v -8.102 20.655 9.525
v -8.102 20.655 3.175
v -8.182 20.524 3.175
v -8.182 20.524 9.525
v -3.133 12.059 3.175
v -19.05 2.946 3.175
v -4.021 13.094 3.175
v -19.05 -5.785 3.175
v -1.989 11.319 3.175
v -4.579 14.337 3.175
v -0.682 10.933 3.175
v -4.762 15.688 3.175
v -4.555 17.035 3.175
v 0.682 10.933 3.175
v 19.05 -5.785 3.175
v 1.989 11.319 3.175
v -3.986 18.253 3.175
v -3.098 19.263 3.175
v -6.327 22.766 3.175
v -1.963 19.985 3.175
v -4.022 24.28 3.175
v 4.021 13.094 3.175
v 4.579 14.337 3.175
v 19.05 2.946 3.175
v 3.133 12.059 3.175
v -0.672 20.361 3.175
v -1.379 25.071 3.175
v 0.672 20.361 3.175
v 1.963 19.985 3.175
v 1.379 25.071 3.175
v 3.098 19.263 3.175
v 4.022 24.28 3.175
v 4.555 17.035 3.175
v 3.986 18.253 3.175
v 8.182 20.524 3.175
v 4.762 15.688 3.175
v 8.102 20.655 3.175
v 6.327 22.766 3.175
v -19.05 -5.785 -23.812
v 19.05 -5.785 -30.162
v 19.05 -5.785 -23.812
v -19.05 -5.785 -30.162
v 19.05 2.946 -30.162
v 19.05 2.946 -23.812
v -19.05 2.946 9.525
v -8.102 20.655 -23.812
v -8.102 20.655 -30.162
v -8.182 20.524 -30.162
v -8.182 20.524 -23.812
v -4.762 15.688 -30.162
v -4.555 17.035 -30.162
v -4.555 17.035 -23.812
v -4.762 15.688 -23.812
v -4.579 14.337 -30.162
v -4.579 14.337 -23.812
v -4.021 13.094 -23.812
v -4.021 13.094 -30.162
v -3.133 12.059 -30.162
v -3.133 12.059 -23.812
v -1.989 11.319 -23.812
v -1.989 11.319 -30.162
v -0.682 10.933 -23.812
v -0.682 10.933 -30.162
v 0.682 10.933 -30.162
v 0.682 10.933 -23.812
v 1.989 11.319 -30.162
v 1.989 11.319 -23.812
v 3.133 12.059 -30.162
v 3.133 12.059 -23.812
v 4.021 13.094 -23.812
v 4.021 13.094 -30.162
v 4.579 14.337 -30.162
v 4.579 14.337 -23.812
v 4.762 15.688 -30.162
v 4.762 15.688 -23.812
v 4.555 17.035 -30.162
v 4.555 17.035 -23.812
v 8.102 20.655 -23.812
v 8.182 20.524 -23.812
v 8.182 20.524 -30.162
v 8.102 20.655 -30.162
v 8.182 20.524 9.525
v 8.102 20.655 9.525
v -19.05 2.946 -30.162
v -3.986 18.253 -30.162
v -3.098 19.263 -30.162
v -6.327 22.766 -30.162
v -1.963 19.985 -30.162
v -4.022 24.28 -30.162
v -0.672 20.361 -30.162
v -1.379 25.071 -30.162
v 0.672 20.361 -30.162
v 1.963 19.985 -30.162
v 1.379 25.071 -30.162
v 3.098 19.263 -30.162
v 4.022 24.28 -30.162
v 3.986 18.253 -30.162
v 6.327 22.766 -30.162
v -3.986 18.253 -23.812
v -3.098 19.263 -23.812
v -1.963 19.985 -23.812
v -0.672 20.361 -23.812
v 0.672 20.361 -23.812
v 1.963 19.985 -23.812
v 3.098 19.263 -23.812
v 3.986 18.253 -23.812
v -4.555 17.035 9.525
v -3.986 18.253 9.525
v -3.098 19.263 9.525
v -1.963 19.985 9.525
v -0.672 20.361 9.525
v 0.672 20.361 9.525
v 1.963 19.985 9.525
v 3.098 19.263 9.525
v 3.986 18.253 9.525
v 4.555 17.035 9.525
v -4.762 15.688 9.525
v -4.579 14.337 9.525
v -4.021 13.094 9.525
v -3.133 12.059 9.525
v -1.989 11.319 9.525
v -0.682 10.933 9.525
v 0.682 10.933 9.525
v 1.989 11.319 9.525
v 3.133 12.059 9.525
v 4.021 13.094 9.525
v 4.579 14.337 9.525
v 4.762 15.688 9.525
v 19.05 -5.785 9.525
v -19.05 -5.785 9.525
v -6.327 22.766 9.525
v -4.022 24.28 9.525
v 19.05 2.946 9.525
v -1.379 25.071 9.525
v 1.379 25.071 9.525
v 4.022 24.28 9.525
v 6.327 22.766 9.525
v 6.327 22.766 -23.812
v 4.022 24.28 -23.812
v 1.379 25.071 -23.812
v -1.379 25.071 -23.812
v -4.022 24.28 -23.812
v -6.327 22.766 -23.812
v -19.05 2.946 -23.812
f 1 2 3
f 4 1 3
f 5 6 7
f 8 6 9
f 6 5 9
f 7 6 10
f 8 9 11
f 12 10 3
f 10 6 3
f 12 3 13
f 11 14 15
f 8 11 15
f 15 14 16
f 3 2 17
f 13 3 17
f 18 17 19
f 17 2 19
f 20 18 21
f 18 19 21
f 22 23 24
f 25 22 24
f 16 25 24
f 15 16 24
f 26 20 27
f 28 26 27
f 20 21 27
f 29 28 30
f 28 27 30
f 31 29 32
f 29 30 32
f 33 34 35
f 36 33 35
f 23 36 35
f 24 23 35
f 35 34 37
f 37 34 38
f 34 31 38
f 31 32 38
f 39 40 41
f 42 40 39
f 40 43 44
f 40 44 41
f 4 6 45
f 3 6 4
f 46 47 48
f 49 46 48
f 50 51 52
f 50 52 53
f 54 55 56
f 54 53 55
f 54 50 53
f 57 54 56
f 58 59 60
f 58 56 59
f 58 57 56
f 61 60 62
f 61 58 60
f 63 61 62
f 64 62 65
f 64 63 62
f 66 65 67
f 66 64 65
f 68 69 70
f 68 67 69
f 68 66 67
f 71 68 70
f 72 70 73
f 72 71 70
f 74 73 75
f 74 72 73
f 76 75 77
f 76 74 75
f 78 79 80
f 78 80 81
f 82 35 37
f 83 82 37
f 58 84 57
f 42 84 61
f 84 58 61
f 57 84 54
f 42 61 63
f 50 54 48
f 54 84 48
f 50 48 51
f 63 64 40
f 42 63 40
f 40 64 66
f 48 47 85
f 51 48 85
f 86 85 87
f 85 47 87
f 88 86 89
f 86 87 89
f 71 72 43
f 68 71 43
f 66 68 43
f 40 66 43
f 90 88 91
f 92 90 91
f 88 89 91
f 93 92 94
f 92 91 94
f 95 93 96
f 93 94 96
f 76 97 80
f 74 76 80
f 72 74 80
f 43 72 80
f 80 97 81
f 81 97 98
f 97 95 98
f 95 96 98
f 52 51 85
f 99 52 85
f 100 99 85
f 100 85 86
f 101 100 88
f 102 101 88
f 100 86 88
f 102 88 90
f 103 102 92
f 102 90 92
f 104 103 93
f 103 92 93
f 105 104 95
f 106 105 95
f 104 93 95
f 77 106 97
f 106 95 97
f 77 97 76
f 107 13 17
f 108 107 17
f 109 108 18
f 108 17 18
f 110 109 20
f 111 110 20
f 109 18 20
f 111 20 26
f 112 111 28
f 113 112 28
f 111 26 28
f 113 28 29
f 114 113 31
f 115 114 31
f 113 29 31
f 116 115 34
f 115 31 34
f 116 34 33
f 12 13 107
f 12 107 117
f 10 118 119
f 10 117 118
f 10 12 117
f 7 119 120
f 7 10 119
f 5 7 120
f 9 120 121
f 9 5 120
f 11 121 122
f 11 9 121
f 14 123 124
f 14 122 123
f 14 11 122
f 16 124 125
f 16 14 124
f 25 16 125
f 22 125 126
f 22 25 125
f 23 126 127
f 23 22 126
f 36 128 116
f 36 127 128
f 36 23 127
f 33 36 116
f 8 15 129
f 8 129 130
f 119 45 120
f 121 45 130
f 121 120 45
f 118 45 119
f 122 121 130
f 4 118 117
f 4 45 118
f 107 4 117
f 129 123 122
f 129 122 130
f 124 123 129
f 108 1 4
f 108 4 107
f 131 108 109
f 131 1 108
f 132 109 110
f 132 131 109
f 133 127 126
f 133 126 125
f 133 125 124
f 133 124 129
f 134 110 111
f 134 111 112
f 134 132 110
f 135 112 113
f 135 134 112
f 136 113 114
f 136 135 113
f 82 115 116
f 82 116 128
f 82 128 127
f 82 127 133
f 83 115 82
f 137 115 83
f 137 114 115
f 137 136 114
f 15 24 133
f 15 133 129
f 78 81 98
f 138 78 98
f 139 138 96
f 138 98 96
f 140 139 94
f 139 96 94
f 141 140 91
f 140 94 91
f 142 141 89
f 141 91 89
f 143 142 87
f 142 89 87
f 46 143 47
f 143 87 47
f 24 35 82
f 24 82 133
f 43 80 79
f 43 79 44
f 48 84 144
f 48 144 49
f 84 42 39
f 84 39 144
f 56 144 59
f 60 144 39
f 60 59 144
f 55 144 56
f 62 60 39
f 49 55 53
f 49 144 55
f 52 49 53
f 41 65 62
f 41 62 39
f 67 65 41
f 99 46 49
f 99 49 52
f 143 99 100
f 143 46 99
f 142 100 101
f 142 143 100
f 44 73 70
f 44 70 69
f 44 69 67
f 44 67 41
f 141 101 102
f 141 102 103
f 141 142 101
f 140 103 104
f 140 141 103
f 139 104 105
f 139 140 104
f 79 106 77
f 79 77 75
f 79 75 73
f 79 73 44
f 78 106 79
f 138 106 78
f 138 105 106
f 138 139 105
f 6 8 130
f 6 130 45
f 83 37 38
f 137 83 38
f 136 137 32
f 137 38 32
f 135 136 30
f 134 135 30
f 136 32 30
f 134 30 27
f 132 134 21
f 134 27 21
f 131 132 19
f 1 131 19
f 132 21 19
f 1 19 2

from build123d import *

# Parameters (mm, degrees)
SKETCH1_R           = 9.525
SKETCH1_W           = 76.2
SKETCH1_H           = 17.4625
BOSS_EXTRUDE1_DEPTH = 12.7
LPATTERN1_COUNT     = 2
LPATTERN1_PITCH     = 33.3375
SCALE1_START        = -33.3375
SCALE1_DEPTH        = 46.0375
SCALE1_START_2      = -23.8125
SCALE1_2_DEPTH      = 26.9875
SCALE1_3_DEPTH      = 3.175
SCALE1_START_3      = 9.525
SCALE1_4_DEPTH      = 3.175
SCALE1_START_4      = -30.1625
SCALE1_5_DEPTH      = 6.35
SCALE1_START_5      = 3.175
SCALE1_6_DEPTH      = 6.35


# Read off the part's stored shape, not the designer's step: Scale1
with BuildPart() as part:
    # Sketch1 → Boss-Extrude1 (new body)
    # profile 1 of 2: a face of its own
    with BuildSketch(Plane.XY):
        with BuildLine():
            ThreePointArc((-16.203400299, 35.417600449), (0, 44.45), (16.203400299, 35.417600449))
            Line((16.203400299, 35.417600449), (38.1, 0))
            Line((38.1, 0), (-38.1, 0))
            Line((-38.1, 0), (-16.203400299, 35.417600449))
        make_face()
        with Locations((0, 25.4)):
            Circle(SKETCH1_R, mode=Mode.SUBTRACT)
    # profile 2 of 2: a face of its own
    with BuildSketch(Plane.XY):
        with Locations((0, -8.73125)):
            Rectangle(SKETCH1_W, SKETCH1_H)
    extrude(amount=BOSS_EXTRUDE1_DEPTH)


with BuildPart() as lpattern1_1:
    # LPattern1: pattern copy
    add(part.part.moved(Location(Vector(0, 0, -1) * (1 * LPATTERN1_PITCH))))


with BuildPart() as scale1_tool:
    # Scale1 outline → Scale1 (new body)
    # profile 1 of 2: a face of its own
    with BuildSketch(Plane.XY.offset(SCALE1_START)):
        with BuildLine():
            ThreePointArc((16.203400299, 35.417600449), (0, 44.45), (-16.203400299, 35.417600449))
            Line((-16.203400299, 35.417600449), (-38.1, 0))
            Line((-38.1, 0), (-38.1, -17.4625))
            Line((-38.1, -17.4625), (38.1, -17.4625))
            Line((38.1, -17.4625), (38.1, 0))
            Line((38.1, 0), (16.203400299, 35.417600449))
        make_face()
        with BuildLine():
            Line((-19.05, 2.946121023), (-8.182474067, 20.524269988))
            ThreePointArc((-8.182474067, 20.524269988), (0, 34.925), (8.182474067, 20.524269988))
            Line((8.182474067, 20.524269988), (19.05, 2.946121023))
            Line((19.05, 2.946121023), (19.05, -5.785128977))
            Line((19.05, -5.785128977), (-19.05, -5.785128977))
            Line((-19.05, -5.785128977), (-19.05, 2.946121023))
        make_face(mode=Mode.SUBTRACT)
    # profile 2 of 2: a face of its own
    with BuildSketch(Plane.XY.offset(SCALE1_START)):
        with BuildLine():
            ThreePointArc((4.555482234, 17.035001099), (0, 15.875), (-4.555482234, 17.035001099))
            ThreePointArc((-4.555482234, 17.035001099), (0, 10.883621023), (4.555482234, 17.035001099))
        make_face()
    extrude(amount=SCALE1_DEPTH)


with BuildPart() as part_1:
    add(part.part)

    # Scale1: cut by scale1_tool
    add(scale1_tool.part, mode=Mode.SUBTRACT)


with BuildPart() as lpattern1_1_1:
    add(lpattern1_1.part)

    # Scale1: cut by scale1_tool
    add(scale1_tool.part, mode=Mode.SUBTRACT)


with BuildPart() as scale1_2_tool:
    # Scale1 2 outline → Scale1 2 (new body)
    with BuildSketch(Plane.XY.offset(SCALE1_START_2)):
        with BuildLine():
            ThreePointArc((-4.555482234, 17.035001099), (-6.603607501, 18.535745272), (-8.182474067, 20.524269988))
            Line((-8.182474067, 20.524269988), (-19.05, 2.946121023))
            Line((-19.05, 2.946121023), (-19.05, -5.785128977))
            Line((-19.05, -5.785128977), (19.05, -5.785128977))
            Line((19.05, -5.785128977), (19.05, 2.946121023))
            Line((19.05, 2.946121023), (8.182474067, 20.524269988))
            ThreePointArc((8.182474067, 20.524269988), (6.603607501, 18.535745272), (4.555482234, 17.035001099))
            ThreePointArc((4.555482234, 17.035001099), (0, 10.883621023), (-4.555482234, 17.035001099))
        make_face()
    extrude(amount=SCALE1_2_DEPTH)


with BuildPart() as part_2:
    add(part_1.part)

    # Scale1 2: cut by scale1_2_tool
    add(scale1_2_tool.part, mode=Mode.SUBTRACT)

    # Scale1 4 outline → Scale1 4 (cut)
    with BuildSketch(Plane.XY.offset(SCALE1_START_3)):
        with BuildLine():
            ThreePointArc((-4.555482234, 17.035001099), (-6.603607501, 18.535745272), (-8.182474067, 20.524269988))
            Line((-8.182474067, 20.524269988), (-19.05, 2.946121023))
            Line((-19.05, 2.946121023), (-19.05, -5.785128977))
            Line((-19.05, -5.785128977), (19.05, -5.785128977))
            Line((19.05, -5.785128977), (19.05, 2.946121023))
            Line((19.05, 2.946121023), (8.182474067, 20.524269988))
            ThreePointArc((8.182474067, 20.524269988), (6.603607501, 18.535745272), (4.555482234, 17.035001099))
            ThreePointArc((4.555482234, 17.035001099), (0, 10.883621023), (-4.555482234, 17.035001099))
        make_face()
    extrude(amount=SCALE1_4_DEPTH, mode=Mode.SUBTRACT)


with BuildPart() as lpattern1_1_2:
    add(lpattern1_1_1.part)

    # Scale1 2: cut by scale1_2_tool
    add(scale1_2_tool.part, mode=Mode.SUBTRACT)

    # Scale1 3 outline → Scale1 3 (cut)
    with BuildSketch(Plane.XY.offset(SCALE1_START)):
        with BuildLine():
            ThreePointArc((-4.555482234, 17.035001099), (-6.603607501, 18.535745272), (-8.182474067, 20.524269988))
            Line((-8.182474067, 20.524269988), (-19.05, 2.946121023))
            Line((-19.05, 2.946121023), (-19.05, -5.785128977))
            Line((-19.05, -5.785128977), (19.05, -5.785128977))
            Line((19.05, -5.785128977), (19.05, 2.946121023))
            Line((19.05, 2.946121023), (8.182474067, 20.524269988))
            ThreePointArc((8.182474067, 20.524269988), (6.603607501, 18.535745272), (4.555482234, 17.035001099))
            ThreePointArc((4.555482234, 17.035001099), (0, 10.883621023), (-4.555482234, 17.035001099))
        make_face()
    extrude(amount=SCALE1_3_DEPTH, mode=Mode.SUBTRACT)


    add(part_2.part)  # Scale1 5 merges part
    # Scale1 5 outline → Scale1 5 (add)
    with BuildSketch(Plane.XY.offset(SCALE1_START_4)):
        with BuildLine():
            ThreePointArc((8.10170015, 20.654921247), (0, 25.171121023), (-8.10170015, 20.654921247))
            Line((-8.10170015, 20.654921247), (-8.182474067, 20.524269988))
            ThreePointArc((-8.182474067, 20.524269988), (-6.603607501, 18.535745272), (-4.555482234, 17.035001099))
            ThreePointArc((-4.555482234, 17.035001099), (0, 20.408621023), (4.555482234, 17.035001099))
            ThreePointArc((4.555482234, 17.035001099), (6.603607501, 18.535745272), (8.182474067, 20.524269988))
            Line((8.182474067, 20.524269988), (8.10170015, 20.654921247))
        make_face()
    extrude(amount=SCALE1_5_DEPTH)

    # Scale1 6 outline → Scale1 6 (add)
    with BuildSketch(Plane.XY.offset(SCALE1_START_5)):
        with BuildLine():
            ThreePointArc((8.10170015, 20.654921247), (0, 25.171121023), (-8.10170015, 20.654921247))
            Line((-8.10170015, 20.654921247), (-8.182474067, 20.524269988))
            ThreePointArc((-8.182474067, 20.524269988), (-6.603607501, 18.535745272), (-4.555482234, 17.035001099))
            ThreePointArc((-4.555482234, 17.035001099), (0, 20.408621023), (4.555482234, 17.035001099))
            ThreePointArc((4.555482234, 17.035001099), (6.603607501, 18.535745272), (8.182474067, 20.524269988))
            Line((8.182474067, 20.524269988), (8.10170015, 20.654921247))
        make_face()
    extrude(amount=SCALE1_6_DEPTH)


solid = lpattern1_1_2.part
